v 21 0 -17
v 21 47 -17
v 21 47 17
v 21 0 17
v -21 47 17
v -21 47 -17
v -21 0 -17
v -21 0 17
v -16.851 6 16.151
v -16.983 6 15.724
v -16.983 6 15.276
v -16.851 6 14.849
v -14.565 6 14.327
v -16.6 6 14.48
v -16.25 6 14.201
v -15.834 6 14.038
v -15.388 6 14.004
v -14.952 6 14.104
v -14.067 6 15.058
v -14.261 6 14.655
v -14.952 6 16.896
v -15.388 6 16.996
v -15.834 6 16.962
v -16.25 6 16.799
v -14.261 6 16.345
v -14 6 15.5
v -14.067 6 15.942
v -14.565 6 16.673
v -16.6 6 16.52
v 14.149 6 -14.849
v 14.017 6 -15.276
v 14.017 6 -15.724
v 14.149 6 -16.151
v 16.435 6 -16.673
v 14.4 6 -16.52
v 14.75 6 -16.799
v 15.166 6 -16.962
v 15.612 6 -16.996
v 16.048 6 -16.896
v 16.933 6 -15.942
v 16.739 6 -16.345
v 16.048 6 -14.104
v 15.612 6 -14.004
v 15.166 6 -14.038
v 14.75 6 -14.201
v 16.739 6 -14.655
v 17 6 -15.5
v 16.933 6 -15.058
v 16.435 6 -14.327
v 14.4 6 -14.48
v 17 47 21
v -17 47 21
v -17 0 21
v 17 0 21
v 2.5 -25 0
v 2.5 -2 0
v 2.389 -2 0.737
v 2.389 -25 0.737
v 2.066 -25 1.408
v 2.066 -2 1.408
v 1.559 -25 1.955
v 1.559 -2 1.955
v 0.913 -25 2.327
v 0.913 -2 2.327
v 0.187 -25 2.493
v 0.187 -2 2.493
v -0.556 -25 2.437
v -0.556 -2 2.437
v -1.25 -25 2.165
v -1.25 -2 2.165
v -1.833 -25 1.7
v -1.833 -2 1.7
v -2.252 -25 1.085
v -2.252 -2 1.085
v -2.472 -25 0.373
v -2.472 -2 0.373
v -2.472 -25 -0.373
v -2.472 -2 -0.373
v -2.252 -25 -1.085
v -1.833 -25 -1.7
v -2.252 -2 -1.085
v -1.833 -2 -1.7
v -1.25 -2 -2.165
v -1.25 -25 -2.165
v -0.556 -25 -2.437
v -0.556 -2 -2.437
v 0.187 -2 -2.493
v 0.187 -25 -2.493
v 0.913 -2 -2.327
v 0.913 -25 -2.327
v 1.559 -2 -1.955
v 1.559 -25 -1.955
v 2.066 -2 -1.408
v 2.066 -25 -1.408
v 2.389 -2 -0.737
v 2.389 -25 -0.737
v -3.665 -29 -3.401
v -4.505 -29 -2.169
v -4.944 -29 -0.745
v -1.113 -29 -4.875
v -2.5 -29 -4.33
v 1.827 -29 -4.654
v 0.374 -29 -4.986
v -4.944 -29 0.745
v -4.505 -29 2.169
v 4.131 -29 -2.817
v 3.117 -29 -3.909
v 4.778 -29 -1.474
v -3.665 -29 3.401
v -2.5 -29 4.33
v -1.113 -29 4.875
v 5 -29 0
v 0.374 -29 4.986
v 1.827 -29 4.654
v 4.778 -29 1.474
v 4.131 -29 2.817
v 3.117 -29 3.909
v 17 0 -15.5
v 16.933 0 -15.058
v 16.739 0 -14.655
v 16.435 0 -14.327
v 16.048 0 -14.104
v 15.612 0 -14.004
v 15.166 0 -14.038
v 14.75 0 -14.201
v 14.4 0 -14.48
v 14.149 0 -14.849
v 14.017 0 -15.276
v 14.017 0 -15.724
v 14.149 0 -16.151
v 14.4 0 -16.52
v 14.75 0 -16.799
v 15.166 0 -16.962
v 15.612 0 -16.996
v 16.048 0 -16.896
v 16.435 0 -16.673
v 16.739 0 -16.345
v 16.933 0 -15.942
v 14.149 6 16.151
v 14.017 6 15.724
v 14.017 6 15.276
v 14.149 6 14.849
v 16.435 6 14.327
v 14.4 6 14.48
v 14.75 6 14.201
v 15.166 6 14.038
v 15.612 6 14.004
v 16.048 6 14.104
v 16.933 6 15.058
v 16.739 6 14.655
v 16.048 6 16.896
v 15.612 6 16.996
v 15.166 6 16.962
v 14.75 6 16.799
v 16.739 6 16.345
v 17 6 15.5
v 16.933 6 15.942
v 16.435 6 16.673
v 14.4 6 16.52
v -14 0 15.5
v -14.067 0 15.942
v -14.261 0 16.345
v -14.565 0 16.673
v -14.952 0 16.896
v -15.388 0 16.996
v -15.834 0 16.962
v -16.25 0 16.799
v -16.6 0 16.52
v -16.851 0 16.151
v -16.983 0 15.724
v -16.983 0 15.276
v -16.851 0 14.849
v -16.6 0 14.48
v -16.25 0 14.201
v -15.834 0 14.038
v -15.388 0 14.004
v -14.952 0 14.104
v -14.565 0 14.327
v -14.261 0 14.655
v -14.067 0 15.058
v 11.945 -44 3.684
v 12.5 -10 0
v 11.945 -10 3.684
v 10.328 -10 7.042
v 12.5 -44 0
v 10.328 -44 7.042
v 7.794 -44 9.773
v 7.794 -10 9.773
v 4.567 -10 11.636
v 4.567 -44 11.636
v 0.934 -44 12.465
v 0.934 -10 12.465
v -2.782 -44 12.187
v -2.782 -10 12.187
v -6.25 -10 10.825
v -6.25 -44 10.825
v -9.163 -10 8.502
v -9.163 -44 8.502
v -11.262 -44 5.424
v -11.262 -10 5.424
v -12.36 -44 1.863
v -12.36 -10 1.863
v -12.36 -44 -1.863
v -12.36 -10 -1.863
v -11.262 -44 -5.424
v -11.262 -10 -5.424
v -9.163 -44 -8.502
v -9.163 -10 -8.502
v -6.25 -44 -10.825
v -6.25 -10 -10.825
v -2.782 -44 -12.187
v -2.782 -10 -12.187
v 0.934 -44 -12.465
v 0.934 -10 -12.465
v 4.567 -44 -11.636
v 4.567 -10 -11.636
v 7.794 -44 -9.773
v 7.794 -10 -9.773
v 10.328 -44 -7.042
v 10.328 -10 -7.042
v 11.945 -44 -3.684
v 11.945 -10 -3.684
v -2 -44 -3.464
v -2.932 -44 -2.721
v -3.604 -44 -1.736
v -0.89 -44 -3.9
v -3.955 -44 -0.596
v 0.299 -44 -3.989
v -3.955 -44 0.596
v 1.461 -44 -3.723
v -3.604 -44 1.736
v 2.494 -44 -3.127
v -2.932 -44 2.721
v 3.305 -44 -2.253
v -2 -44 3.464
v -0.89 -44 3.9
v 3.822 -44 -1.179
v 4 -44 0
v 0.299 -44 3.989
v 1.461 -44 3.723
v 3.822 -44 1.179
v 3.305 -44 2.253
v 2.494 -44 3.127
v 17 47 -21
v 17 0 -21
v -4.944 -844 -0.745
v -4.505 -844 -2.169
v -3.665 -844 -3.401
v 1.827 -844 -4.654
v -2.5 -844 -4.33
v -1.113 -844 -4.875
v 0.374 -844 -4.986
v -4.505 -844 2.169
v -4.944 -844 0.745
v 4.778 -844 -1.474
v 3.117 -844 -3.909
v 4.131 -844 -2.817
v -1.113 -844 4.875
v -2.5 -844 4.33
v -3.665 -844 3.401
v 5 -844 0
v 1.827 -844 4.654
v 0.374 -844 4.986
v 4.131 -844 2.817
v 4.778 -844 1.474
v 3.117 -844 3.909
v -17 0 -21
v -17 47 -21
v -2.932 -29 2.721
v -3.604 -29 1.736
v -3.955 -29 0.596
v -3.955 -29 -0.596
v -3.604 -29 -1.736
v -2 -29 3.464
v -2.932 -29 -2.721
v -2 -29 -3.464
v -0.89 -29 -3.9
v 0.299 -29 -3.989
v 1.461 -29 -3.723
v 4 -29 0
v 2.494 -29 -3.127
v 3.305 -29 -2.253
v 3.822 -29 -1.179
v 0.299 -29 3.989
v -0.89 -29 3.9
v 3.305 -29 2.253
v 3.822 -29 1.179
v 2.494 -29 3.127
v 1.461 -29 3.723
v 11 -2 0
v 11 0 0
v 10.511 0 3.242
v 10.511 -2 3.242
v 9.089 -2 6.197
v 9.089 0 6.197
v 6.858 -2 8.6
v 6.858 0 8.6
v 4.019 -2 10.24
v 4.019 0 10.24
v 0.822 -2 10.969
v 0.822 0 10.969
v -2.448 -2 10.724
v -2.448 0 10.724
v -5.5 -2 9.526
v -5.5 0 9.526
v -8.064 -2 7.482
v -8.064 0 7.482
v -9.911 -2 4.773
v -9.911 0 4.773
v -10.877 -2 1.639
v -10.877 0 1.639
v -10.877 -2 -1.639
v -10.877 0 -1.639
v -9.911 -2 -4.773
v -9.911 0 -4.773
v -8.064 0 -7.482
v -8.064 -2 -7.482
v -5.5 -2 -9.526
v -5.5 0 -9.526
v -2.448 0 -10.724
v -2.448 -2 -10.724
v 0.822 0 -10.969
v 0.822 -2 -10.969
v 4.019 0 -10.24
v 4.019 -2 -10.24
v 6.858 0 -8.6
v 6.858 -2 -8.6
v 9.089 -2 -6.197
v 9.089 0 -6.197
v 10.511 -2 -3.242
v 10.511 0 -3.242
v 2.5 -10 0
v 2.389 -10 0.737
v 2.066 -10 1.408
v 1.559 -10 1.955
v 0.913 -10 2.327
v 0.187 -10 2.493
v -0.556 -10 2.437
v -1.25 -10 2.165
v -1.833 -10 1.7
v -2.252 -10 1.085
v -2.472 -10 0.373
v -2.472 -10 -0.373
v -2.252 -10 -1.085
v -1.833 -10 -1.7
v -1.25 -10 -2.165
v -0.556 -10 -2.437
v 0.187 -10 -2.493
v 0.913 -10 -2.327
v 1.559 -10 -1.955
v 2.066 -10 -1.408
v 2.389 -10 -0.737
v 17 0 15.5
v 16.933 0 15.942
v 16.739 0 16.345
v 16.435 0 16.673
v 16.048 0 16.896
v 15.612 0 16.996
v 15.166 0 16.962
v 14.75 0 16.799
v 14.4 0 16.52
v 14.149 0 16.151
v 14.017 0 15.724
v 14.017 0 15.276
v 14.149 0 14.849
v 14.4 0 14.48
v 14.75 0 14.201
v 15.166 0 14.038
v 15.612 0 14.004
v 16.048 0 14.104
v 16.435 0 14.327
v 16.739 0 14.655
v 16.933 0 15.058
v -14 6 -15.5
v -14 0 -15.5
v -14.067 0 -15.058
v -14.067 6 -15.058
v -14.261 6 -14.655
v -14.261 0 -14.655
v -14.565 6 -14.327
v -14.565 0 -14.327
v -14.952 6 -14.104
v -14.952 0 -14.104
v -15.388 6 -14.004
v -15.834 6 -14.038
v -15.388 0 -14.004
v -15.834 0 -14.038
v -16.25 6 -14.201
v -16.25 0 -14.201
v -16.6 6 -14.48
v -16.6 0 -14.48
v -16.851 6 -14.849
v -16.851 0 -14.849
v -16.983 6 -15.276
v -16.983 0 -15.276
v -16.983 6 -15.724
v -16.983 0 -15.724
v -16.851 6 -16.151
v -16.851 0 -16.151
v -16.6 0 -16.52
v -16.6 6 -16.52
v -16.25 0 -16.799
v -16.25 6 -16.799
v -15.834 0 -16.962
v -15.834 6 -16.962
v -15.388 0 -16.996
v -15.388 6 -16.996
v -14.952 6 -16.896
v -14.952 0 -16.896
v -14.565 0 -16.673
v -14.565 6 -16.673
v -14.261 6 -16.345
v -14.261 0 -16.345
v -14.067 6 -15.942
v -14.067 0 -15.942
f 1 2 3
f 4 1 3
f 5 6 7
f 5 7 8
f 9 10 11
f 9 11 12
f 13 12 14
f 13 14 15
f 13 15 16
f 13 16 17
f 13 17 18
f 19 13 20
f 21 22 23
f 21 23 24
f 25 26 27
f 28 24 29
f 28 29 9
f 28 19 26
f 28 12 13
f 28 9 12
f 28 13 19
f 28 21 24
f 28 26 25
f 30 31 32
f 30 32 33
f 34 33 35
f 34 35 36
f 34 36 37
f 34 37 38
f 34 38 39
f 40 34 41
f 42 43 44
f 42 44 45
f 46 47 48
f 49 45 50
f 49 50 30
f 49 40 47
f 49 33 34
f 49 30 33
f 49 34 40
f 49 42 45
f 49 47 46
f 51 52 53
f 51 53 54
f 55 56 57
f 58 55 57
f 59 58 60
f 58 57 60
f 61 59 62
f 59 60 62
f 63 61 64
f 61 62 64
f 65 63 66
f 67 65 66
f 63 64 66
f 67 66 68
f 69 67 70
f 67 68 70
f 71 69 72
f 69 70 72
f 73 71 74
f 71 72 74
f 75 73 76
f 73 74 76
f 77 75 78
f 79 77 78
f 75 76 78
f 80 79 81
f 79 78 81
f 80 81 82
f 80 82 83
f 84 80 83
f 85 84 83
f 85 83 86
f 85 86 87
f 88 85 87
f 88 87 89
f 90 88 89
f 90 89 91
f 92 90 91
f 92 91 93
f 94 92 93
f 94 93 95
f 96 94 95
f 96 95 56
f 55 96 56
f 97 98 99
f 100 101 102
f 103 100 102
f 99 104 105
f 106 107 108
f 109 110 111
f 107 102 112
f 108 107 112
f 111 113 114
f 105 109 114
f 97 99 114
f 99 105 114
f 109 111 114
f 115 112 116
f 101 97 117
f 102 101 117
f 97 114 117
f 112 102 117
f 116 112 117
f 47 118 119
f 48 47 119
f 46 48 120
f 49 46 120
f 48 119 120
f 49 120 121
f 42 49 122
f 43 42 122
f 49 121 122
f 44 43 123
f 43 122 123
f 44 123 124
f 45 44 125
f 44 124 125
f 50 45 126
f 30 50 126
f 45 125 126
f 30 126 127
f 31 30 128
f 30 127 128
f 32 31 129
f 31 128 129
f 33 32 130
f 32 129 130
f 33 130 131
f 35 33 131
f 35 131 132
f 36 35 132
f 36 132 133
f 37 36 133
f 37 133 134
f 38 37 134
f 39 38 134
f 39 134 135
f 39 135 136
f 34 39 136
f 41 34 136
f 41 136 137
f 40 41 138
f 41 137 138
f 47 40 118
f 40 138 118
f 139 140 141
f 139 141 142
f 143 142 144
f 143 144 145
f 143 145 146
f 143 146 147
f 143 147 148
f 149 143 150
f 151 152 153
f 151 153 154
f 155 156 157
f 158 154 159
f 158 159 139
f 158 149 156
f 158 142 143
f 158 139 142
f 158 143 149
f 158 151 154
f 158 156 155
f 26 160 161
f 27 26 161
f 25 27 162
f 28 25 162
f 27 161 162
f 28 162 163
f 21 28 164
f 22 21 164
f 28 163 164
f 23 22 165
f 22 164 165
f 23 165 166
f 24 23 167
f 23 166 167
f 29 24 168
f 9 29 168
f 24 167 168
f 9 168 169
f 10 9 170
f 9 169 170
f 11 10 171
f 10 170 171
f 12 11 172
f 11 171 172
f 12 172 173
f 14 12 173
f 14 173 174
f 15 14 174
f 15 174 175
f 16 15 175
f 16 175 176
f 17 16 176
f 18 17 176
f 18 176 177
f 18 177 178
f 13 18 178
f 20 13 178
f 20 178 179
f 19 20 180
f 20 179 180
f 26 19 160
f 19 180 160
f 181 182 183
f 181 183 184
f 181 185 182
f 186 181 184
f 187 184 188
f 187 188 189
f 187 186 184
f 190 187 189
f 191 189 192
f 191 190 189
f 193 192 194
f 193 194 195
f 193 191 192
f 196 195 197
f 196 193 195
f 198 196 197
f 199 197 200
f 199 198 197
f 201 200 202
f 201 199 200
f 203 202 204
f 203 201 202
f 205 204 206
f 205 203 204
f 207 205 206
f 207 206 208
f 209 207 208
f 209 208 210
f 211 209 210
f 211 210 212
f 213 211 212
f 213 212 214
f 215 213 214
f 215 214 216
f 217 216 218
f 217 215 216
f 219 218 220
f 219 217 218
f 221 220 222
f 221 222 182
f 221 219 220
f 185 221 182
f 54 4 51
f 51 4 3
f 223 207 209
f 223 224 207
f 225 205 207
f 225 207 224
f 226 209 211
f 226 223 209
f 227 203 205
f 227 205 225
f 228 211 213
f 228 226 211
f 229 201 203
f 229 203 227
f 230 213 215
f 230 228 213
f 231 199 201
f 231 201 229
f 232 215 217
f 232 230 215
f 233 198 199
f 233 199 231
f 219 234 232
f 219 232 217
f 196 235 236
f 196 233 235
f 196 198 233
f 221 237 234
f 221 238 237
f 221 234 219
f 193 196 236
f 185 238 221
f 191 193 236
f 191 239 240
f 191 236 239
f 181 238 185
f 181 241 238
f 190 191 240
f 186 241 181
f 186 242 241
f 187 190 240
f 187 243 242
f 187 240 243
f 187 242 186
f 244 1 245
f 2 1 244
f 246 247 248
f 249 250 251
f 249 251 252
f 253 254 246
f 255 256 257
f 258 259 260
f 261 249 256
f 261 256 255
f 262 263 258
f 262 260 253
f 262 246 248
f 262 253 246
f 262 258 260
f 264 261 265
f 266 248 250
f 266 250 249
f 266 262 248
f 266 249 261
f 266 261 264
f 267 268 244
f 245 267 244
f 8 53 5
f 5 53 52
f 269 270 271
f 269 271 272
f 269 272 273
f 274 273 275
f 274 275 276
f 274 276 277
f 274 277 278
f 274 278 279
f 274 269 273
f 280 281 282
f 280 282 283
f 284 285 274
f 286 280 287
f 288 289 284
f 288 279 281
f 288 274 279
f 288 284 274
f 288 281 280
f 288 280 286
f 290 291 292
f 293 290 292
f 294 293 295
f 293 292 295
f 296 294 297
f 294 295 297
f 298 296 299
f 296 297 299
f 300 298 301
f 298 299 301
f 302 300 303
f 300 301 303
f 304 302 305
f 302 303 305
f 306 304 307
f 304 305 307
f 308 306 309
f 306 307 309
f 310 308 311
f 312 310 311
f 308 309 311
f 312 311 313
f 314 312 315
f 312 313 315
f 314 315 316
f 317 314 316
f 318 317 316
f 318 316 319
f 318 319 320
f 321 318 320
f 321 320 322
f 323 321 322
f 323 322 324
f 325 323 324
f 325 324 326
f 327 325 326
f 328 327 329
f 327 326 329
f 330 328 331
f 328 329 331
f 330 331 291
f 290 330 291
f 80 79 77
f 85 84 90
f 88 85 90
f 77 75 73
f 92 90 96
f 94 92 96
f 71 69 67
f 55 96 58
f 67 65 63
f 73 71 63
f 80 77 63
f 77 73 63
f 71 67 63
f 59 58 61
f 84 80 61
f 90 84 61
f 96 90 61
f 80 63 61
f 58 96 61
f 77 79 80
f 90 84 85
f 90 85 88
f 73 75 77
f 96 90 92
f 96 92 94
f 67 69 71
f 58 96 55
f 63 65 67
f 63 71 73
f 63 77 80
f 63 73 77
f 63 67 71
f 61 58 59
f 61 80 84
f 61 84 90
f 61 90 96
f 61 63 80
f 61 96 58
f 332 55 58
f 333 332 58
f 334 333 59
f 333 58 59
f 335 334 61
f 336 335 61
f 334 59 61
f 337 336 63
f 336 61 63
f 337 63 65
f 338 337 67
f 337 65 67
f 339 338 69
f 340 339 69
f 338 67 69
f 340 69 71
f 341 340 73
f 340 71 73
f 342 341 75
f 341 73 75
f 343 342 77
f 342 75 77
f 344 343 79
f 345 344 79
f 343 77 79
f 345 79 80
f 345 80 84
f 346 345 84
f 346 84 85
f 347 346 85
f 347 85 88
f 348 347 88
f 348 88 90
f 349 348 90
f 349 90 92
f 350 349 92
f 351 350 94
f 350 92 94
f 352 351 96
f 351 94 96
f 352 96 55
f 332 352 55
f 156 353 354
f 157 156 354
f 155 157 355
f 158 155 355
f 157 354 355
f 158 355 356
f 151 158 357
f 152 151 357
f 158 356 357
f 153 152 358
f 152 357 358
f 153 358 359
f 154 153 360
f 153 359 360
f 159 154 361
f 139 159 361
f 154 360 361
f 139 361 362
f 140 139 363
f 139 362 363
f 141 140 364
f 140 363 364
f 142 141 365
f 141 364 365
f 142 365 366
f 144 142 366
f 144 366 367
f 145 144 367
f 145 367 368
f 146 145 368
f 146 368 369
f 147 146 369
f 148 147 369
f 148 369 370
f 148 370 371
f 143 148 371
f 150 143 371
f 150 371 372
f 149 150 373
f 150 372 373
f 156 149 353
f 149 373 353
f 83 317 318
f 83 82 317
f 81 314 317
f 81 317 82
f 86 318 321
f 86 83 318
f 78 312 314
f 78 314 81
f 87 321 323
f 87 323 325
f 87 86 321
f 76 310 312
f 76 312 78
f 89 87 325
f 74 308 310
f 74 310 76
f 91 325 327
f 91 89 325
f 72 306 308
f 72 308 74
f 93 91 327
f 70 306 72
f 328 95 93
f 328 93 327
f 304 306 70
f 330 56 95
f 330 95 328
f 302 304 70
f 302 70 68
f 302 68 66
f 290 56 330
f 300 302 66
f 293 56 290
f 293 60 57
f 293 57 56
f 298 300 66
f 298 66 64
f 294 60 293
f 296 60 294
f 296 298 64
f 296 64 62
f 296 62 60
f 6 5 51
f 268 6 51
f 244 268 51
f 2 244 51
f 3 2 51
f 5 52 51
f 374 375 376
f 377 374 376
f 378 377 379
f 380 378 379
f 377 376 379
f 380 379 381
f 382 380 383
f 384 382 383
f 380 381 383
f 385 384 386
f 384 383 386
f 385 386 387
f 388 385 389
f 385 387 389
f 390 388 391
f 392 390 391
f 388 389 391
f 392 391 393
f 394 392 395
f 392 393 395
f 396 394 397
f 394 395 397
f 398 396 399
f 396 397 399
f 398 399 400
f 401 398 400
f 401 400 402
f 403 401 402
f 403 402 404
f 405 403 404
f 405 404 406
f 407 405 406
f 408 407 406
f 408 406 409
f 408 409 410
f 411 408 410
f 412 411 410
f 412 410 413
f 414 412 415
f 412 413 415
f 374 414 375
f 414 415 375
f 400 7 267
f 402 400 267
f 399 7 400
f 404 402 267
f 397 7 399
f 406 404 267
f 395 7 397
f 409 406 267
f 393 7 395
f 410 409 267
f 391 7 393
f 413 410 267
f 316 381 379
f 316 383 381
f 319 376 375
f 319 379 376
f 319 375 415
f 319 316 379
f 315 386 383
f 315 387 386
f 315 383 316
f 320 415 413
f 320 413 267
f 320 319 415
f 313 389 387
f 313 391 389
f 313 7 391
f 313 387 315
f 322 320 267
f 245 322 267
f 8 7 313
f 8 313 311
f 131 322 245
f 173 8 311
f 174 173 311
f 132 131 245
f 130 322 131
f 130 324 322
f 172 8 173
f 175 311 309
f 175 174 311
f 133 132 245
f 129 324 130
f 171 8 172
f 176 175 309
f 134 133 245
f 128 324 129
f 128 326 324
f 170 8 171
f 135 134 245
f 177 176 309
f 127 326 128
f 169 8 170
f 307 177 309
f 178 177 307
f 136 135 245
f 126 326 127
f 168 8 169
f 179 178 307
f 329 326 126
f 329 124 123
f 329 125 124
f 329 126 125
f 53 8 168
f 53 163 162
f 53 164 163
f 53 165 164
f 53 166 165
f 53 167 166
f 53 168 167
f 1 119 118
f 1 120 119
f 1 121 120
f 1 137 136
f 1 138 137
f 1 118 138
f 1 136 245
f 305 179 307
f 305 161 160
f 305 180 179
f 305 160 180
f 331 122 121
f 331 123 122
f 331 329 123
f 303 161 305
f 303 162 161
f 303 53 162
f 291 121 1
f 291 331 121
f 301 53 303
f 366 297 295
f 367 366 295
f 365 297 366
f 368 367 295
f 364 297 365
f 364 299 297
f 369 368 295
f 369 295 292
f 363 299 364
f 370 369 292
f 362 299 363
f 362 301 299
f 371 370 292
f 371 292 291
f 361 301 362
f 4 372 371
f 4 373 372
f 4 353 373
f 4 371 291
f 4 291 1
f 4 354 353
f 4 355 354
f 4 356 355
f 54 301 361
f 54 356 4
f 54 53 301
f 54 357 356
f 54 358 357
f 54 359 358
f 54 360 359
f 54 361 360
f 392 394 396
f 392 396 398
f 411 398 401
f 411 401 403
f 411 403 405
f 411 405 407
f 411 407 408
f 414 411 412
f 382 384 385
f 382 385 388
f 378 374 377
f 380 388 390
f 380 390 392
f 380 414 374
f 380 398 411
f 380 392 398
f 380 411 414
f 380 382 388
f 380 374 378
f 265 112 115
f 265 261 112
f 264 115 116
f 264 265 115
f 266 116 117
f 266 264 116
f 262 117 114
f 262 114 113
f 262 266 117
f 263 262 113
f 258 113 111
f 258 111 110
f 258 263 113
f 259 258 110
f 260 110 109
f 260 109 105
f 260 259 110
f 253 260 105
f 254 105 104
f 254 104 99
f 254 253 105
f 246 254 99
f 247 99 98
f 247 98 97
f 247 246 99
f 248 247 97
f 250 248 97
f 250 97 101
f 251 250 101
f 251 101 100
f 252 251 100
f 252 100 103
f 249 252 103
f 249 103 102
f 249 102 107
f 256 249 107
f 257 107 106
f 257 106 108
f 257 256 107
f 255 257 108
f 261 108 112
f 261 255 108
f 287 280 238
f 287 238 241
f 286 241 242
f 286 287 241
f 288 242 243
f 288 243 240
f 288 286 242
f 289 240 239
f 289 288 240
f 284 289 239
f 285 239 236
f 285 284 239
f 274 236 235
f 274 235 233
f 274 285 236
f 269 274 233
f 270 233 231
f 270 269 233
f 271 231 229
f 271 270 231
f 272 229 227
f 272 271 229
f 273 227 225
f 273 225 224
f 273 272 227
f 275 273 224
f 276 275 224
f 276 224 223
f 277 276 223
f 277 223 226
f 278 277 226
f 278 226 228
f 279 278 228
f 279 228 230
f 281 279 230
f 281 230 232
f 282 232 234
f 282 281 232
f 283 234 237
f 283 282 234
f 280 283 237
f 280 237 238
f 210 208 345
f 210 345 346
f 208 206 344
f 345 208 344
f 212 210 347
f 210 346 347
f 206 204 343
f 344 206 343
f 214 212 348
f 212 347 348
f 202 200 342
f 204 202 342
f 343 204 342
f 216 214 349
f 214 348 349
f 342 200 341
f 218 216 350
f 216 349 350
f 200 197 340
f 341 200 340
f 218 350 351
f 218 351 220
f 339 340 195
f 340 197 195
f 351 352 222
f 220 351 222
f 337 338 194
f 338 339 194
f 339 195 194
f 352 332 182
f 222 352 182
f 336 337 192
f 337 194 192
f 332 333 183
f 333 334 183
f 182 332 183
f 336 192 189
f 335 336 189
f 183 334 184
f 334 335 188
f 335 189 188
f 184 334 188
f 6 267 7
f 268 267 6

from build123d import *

# Parameters (mm, degrees)
F0_W           = 42
F0_H           = 42
F0_R           = 11
F0_R_2         = 2.5
F1_DEPTH       = 47
F2_DEPTH       = 2
F3_DEPTH       = 25
F4_SIZE        = 4
F5_R           = 1.5
F6_DEPTH       = 6
F7_R           = 12.5
F7_R_2         = 4
F7_R_3         = 2.5
F8_DEPTH       = 19
F8_DEPTH_BACK  = 15
F9_DEPTH       = 15
F10_START      = 4
F10_DEPTH      = 15
F11_R          = 5
F11_R_2        = 4
F12_DEPTH      = 800
F12_DEPTH_BACK = 15


with BuildPart() as f1:
    # F0 (on Front) → F1 (new body)
    with BuildSketch(Plane.XZ):
        Rectangle(F0_W, F0_H)
        Circle(F0_R, mode=Mode.SUBTRACT)
        Circle(F0_R)
        Circle(F0_R_2, mode=Mode.SUBTRACT)
        Circle(F0_R_2)
    extrude(amount=-F1_DEPTH)

    # F0 (on Front) → F2 (join)
    with BuildSketch(Plane.XZ):
        Circle(F0_R)
        Circle(F0_R_2, mode=Mode.SUBTRACT)
        Circle(F0_R_2)
    extrude(amount=F2_DEPTH)

    # F0 (on Front) → F3 (join)
    with BuildSketch(Plane.XZ):
        Circle(F0_R_2)
    extrude(amount=F3_DEPTH)

    # F4
    f4_edges = [f1.edges().sort_by_distance(p)[0] for p in [
        (21, 23.5, 21),
        (-21, 23.5, 21),
        (21, 23.5, -21),
        (-21, 23.5, -21),
    ]]
    chamfer(f4_edges, length=F4_SIZE)

    # F5 (on face) → F6 (cut)
    with BuildSketch(Plane.XZ):
        with Locations((15.5, -15.5)):
            Circle(F5_R)
        with Locations((-15.5, -15.5)):
            Circle(F5_R)
        with Locations((-15.5, 15.5)):
            Circle(F5_R)
        with Locations((15.5, 15.5)):
            Circle(F5_R)
    extrude(amount=-F6_DEPTH, mode=Mode.SUBTRACT)


with BuildPart() as f8:
    # F7 (on face) → F8 (new body, two sides)
    with BuildSketch(Plane.XZ.offset(25)) as f8_sk:
        Circle(F7_R)
        Circle(F7_R_2, mode=Mode.SUBTRACT)
        Circle(F7_R_2)
        Circle(F7_R_3, mode=Mode.SUBTRACT)
        Circle(F7_R_3)
    extrude(amount=F8_DEPTH)
    extrude(f8_sk.sketch, amount=-F8_DEPTH_BACK)

    # F7 (on face) → F9 (cut)
    with BuildSketch(Plane.XZ.offset(25)):
        Circle(F7_R_3)
    extrude(amount=-F9_DEPTH, mode=Mode.SUBTRACT)

    # F7 (on face) → F10 (cut)
    with BuildSketch(Plane.XZ.offset(25).offset(F10_START)):
        Circle(F7_R_2)
        Circle(F7_R_3, mode=Mode.SUBTRACT)
        Circle(F7_R_3)
    extrude(amount=F10_DEPTH, mode=Mode.SUBTRACT)


with BuildPart() as f12:
    # F11 (on face) → F12 (new body, two sides)
    with BuildSketch(Plane.XZ.offset(44)) as f12_sk:
        Circle(F11_R)
        Circle(F11_R_2, mode=Mode.SUBTRACT)
        Circle(F11_R_2)
    extrude(amount=F12_DEPTH)
    extrude(f12_sk.sketch, amount=-F12_DEPTH_BACK)


solid = Compound([f1.part, f8.part, f12.part])
